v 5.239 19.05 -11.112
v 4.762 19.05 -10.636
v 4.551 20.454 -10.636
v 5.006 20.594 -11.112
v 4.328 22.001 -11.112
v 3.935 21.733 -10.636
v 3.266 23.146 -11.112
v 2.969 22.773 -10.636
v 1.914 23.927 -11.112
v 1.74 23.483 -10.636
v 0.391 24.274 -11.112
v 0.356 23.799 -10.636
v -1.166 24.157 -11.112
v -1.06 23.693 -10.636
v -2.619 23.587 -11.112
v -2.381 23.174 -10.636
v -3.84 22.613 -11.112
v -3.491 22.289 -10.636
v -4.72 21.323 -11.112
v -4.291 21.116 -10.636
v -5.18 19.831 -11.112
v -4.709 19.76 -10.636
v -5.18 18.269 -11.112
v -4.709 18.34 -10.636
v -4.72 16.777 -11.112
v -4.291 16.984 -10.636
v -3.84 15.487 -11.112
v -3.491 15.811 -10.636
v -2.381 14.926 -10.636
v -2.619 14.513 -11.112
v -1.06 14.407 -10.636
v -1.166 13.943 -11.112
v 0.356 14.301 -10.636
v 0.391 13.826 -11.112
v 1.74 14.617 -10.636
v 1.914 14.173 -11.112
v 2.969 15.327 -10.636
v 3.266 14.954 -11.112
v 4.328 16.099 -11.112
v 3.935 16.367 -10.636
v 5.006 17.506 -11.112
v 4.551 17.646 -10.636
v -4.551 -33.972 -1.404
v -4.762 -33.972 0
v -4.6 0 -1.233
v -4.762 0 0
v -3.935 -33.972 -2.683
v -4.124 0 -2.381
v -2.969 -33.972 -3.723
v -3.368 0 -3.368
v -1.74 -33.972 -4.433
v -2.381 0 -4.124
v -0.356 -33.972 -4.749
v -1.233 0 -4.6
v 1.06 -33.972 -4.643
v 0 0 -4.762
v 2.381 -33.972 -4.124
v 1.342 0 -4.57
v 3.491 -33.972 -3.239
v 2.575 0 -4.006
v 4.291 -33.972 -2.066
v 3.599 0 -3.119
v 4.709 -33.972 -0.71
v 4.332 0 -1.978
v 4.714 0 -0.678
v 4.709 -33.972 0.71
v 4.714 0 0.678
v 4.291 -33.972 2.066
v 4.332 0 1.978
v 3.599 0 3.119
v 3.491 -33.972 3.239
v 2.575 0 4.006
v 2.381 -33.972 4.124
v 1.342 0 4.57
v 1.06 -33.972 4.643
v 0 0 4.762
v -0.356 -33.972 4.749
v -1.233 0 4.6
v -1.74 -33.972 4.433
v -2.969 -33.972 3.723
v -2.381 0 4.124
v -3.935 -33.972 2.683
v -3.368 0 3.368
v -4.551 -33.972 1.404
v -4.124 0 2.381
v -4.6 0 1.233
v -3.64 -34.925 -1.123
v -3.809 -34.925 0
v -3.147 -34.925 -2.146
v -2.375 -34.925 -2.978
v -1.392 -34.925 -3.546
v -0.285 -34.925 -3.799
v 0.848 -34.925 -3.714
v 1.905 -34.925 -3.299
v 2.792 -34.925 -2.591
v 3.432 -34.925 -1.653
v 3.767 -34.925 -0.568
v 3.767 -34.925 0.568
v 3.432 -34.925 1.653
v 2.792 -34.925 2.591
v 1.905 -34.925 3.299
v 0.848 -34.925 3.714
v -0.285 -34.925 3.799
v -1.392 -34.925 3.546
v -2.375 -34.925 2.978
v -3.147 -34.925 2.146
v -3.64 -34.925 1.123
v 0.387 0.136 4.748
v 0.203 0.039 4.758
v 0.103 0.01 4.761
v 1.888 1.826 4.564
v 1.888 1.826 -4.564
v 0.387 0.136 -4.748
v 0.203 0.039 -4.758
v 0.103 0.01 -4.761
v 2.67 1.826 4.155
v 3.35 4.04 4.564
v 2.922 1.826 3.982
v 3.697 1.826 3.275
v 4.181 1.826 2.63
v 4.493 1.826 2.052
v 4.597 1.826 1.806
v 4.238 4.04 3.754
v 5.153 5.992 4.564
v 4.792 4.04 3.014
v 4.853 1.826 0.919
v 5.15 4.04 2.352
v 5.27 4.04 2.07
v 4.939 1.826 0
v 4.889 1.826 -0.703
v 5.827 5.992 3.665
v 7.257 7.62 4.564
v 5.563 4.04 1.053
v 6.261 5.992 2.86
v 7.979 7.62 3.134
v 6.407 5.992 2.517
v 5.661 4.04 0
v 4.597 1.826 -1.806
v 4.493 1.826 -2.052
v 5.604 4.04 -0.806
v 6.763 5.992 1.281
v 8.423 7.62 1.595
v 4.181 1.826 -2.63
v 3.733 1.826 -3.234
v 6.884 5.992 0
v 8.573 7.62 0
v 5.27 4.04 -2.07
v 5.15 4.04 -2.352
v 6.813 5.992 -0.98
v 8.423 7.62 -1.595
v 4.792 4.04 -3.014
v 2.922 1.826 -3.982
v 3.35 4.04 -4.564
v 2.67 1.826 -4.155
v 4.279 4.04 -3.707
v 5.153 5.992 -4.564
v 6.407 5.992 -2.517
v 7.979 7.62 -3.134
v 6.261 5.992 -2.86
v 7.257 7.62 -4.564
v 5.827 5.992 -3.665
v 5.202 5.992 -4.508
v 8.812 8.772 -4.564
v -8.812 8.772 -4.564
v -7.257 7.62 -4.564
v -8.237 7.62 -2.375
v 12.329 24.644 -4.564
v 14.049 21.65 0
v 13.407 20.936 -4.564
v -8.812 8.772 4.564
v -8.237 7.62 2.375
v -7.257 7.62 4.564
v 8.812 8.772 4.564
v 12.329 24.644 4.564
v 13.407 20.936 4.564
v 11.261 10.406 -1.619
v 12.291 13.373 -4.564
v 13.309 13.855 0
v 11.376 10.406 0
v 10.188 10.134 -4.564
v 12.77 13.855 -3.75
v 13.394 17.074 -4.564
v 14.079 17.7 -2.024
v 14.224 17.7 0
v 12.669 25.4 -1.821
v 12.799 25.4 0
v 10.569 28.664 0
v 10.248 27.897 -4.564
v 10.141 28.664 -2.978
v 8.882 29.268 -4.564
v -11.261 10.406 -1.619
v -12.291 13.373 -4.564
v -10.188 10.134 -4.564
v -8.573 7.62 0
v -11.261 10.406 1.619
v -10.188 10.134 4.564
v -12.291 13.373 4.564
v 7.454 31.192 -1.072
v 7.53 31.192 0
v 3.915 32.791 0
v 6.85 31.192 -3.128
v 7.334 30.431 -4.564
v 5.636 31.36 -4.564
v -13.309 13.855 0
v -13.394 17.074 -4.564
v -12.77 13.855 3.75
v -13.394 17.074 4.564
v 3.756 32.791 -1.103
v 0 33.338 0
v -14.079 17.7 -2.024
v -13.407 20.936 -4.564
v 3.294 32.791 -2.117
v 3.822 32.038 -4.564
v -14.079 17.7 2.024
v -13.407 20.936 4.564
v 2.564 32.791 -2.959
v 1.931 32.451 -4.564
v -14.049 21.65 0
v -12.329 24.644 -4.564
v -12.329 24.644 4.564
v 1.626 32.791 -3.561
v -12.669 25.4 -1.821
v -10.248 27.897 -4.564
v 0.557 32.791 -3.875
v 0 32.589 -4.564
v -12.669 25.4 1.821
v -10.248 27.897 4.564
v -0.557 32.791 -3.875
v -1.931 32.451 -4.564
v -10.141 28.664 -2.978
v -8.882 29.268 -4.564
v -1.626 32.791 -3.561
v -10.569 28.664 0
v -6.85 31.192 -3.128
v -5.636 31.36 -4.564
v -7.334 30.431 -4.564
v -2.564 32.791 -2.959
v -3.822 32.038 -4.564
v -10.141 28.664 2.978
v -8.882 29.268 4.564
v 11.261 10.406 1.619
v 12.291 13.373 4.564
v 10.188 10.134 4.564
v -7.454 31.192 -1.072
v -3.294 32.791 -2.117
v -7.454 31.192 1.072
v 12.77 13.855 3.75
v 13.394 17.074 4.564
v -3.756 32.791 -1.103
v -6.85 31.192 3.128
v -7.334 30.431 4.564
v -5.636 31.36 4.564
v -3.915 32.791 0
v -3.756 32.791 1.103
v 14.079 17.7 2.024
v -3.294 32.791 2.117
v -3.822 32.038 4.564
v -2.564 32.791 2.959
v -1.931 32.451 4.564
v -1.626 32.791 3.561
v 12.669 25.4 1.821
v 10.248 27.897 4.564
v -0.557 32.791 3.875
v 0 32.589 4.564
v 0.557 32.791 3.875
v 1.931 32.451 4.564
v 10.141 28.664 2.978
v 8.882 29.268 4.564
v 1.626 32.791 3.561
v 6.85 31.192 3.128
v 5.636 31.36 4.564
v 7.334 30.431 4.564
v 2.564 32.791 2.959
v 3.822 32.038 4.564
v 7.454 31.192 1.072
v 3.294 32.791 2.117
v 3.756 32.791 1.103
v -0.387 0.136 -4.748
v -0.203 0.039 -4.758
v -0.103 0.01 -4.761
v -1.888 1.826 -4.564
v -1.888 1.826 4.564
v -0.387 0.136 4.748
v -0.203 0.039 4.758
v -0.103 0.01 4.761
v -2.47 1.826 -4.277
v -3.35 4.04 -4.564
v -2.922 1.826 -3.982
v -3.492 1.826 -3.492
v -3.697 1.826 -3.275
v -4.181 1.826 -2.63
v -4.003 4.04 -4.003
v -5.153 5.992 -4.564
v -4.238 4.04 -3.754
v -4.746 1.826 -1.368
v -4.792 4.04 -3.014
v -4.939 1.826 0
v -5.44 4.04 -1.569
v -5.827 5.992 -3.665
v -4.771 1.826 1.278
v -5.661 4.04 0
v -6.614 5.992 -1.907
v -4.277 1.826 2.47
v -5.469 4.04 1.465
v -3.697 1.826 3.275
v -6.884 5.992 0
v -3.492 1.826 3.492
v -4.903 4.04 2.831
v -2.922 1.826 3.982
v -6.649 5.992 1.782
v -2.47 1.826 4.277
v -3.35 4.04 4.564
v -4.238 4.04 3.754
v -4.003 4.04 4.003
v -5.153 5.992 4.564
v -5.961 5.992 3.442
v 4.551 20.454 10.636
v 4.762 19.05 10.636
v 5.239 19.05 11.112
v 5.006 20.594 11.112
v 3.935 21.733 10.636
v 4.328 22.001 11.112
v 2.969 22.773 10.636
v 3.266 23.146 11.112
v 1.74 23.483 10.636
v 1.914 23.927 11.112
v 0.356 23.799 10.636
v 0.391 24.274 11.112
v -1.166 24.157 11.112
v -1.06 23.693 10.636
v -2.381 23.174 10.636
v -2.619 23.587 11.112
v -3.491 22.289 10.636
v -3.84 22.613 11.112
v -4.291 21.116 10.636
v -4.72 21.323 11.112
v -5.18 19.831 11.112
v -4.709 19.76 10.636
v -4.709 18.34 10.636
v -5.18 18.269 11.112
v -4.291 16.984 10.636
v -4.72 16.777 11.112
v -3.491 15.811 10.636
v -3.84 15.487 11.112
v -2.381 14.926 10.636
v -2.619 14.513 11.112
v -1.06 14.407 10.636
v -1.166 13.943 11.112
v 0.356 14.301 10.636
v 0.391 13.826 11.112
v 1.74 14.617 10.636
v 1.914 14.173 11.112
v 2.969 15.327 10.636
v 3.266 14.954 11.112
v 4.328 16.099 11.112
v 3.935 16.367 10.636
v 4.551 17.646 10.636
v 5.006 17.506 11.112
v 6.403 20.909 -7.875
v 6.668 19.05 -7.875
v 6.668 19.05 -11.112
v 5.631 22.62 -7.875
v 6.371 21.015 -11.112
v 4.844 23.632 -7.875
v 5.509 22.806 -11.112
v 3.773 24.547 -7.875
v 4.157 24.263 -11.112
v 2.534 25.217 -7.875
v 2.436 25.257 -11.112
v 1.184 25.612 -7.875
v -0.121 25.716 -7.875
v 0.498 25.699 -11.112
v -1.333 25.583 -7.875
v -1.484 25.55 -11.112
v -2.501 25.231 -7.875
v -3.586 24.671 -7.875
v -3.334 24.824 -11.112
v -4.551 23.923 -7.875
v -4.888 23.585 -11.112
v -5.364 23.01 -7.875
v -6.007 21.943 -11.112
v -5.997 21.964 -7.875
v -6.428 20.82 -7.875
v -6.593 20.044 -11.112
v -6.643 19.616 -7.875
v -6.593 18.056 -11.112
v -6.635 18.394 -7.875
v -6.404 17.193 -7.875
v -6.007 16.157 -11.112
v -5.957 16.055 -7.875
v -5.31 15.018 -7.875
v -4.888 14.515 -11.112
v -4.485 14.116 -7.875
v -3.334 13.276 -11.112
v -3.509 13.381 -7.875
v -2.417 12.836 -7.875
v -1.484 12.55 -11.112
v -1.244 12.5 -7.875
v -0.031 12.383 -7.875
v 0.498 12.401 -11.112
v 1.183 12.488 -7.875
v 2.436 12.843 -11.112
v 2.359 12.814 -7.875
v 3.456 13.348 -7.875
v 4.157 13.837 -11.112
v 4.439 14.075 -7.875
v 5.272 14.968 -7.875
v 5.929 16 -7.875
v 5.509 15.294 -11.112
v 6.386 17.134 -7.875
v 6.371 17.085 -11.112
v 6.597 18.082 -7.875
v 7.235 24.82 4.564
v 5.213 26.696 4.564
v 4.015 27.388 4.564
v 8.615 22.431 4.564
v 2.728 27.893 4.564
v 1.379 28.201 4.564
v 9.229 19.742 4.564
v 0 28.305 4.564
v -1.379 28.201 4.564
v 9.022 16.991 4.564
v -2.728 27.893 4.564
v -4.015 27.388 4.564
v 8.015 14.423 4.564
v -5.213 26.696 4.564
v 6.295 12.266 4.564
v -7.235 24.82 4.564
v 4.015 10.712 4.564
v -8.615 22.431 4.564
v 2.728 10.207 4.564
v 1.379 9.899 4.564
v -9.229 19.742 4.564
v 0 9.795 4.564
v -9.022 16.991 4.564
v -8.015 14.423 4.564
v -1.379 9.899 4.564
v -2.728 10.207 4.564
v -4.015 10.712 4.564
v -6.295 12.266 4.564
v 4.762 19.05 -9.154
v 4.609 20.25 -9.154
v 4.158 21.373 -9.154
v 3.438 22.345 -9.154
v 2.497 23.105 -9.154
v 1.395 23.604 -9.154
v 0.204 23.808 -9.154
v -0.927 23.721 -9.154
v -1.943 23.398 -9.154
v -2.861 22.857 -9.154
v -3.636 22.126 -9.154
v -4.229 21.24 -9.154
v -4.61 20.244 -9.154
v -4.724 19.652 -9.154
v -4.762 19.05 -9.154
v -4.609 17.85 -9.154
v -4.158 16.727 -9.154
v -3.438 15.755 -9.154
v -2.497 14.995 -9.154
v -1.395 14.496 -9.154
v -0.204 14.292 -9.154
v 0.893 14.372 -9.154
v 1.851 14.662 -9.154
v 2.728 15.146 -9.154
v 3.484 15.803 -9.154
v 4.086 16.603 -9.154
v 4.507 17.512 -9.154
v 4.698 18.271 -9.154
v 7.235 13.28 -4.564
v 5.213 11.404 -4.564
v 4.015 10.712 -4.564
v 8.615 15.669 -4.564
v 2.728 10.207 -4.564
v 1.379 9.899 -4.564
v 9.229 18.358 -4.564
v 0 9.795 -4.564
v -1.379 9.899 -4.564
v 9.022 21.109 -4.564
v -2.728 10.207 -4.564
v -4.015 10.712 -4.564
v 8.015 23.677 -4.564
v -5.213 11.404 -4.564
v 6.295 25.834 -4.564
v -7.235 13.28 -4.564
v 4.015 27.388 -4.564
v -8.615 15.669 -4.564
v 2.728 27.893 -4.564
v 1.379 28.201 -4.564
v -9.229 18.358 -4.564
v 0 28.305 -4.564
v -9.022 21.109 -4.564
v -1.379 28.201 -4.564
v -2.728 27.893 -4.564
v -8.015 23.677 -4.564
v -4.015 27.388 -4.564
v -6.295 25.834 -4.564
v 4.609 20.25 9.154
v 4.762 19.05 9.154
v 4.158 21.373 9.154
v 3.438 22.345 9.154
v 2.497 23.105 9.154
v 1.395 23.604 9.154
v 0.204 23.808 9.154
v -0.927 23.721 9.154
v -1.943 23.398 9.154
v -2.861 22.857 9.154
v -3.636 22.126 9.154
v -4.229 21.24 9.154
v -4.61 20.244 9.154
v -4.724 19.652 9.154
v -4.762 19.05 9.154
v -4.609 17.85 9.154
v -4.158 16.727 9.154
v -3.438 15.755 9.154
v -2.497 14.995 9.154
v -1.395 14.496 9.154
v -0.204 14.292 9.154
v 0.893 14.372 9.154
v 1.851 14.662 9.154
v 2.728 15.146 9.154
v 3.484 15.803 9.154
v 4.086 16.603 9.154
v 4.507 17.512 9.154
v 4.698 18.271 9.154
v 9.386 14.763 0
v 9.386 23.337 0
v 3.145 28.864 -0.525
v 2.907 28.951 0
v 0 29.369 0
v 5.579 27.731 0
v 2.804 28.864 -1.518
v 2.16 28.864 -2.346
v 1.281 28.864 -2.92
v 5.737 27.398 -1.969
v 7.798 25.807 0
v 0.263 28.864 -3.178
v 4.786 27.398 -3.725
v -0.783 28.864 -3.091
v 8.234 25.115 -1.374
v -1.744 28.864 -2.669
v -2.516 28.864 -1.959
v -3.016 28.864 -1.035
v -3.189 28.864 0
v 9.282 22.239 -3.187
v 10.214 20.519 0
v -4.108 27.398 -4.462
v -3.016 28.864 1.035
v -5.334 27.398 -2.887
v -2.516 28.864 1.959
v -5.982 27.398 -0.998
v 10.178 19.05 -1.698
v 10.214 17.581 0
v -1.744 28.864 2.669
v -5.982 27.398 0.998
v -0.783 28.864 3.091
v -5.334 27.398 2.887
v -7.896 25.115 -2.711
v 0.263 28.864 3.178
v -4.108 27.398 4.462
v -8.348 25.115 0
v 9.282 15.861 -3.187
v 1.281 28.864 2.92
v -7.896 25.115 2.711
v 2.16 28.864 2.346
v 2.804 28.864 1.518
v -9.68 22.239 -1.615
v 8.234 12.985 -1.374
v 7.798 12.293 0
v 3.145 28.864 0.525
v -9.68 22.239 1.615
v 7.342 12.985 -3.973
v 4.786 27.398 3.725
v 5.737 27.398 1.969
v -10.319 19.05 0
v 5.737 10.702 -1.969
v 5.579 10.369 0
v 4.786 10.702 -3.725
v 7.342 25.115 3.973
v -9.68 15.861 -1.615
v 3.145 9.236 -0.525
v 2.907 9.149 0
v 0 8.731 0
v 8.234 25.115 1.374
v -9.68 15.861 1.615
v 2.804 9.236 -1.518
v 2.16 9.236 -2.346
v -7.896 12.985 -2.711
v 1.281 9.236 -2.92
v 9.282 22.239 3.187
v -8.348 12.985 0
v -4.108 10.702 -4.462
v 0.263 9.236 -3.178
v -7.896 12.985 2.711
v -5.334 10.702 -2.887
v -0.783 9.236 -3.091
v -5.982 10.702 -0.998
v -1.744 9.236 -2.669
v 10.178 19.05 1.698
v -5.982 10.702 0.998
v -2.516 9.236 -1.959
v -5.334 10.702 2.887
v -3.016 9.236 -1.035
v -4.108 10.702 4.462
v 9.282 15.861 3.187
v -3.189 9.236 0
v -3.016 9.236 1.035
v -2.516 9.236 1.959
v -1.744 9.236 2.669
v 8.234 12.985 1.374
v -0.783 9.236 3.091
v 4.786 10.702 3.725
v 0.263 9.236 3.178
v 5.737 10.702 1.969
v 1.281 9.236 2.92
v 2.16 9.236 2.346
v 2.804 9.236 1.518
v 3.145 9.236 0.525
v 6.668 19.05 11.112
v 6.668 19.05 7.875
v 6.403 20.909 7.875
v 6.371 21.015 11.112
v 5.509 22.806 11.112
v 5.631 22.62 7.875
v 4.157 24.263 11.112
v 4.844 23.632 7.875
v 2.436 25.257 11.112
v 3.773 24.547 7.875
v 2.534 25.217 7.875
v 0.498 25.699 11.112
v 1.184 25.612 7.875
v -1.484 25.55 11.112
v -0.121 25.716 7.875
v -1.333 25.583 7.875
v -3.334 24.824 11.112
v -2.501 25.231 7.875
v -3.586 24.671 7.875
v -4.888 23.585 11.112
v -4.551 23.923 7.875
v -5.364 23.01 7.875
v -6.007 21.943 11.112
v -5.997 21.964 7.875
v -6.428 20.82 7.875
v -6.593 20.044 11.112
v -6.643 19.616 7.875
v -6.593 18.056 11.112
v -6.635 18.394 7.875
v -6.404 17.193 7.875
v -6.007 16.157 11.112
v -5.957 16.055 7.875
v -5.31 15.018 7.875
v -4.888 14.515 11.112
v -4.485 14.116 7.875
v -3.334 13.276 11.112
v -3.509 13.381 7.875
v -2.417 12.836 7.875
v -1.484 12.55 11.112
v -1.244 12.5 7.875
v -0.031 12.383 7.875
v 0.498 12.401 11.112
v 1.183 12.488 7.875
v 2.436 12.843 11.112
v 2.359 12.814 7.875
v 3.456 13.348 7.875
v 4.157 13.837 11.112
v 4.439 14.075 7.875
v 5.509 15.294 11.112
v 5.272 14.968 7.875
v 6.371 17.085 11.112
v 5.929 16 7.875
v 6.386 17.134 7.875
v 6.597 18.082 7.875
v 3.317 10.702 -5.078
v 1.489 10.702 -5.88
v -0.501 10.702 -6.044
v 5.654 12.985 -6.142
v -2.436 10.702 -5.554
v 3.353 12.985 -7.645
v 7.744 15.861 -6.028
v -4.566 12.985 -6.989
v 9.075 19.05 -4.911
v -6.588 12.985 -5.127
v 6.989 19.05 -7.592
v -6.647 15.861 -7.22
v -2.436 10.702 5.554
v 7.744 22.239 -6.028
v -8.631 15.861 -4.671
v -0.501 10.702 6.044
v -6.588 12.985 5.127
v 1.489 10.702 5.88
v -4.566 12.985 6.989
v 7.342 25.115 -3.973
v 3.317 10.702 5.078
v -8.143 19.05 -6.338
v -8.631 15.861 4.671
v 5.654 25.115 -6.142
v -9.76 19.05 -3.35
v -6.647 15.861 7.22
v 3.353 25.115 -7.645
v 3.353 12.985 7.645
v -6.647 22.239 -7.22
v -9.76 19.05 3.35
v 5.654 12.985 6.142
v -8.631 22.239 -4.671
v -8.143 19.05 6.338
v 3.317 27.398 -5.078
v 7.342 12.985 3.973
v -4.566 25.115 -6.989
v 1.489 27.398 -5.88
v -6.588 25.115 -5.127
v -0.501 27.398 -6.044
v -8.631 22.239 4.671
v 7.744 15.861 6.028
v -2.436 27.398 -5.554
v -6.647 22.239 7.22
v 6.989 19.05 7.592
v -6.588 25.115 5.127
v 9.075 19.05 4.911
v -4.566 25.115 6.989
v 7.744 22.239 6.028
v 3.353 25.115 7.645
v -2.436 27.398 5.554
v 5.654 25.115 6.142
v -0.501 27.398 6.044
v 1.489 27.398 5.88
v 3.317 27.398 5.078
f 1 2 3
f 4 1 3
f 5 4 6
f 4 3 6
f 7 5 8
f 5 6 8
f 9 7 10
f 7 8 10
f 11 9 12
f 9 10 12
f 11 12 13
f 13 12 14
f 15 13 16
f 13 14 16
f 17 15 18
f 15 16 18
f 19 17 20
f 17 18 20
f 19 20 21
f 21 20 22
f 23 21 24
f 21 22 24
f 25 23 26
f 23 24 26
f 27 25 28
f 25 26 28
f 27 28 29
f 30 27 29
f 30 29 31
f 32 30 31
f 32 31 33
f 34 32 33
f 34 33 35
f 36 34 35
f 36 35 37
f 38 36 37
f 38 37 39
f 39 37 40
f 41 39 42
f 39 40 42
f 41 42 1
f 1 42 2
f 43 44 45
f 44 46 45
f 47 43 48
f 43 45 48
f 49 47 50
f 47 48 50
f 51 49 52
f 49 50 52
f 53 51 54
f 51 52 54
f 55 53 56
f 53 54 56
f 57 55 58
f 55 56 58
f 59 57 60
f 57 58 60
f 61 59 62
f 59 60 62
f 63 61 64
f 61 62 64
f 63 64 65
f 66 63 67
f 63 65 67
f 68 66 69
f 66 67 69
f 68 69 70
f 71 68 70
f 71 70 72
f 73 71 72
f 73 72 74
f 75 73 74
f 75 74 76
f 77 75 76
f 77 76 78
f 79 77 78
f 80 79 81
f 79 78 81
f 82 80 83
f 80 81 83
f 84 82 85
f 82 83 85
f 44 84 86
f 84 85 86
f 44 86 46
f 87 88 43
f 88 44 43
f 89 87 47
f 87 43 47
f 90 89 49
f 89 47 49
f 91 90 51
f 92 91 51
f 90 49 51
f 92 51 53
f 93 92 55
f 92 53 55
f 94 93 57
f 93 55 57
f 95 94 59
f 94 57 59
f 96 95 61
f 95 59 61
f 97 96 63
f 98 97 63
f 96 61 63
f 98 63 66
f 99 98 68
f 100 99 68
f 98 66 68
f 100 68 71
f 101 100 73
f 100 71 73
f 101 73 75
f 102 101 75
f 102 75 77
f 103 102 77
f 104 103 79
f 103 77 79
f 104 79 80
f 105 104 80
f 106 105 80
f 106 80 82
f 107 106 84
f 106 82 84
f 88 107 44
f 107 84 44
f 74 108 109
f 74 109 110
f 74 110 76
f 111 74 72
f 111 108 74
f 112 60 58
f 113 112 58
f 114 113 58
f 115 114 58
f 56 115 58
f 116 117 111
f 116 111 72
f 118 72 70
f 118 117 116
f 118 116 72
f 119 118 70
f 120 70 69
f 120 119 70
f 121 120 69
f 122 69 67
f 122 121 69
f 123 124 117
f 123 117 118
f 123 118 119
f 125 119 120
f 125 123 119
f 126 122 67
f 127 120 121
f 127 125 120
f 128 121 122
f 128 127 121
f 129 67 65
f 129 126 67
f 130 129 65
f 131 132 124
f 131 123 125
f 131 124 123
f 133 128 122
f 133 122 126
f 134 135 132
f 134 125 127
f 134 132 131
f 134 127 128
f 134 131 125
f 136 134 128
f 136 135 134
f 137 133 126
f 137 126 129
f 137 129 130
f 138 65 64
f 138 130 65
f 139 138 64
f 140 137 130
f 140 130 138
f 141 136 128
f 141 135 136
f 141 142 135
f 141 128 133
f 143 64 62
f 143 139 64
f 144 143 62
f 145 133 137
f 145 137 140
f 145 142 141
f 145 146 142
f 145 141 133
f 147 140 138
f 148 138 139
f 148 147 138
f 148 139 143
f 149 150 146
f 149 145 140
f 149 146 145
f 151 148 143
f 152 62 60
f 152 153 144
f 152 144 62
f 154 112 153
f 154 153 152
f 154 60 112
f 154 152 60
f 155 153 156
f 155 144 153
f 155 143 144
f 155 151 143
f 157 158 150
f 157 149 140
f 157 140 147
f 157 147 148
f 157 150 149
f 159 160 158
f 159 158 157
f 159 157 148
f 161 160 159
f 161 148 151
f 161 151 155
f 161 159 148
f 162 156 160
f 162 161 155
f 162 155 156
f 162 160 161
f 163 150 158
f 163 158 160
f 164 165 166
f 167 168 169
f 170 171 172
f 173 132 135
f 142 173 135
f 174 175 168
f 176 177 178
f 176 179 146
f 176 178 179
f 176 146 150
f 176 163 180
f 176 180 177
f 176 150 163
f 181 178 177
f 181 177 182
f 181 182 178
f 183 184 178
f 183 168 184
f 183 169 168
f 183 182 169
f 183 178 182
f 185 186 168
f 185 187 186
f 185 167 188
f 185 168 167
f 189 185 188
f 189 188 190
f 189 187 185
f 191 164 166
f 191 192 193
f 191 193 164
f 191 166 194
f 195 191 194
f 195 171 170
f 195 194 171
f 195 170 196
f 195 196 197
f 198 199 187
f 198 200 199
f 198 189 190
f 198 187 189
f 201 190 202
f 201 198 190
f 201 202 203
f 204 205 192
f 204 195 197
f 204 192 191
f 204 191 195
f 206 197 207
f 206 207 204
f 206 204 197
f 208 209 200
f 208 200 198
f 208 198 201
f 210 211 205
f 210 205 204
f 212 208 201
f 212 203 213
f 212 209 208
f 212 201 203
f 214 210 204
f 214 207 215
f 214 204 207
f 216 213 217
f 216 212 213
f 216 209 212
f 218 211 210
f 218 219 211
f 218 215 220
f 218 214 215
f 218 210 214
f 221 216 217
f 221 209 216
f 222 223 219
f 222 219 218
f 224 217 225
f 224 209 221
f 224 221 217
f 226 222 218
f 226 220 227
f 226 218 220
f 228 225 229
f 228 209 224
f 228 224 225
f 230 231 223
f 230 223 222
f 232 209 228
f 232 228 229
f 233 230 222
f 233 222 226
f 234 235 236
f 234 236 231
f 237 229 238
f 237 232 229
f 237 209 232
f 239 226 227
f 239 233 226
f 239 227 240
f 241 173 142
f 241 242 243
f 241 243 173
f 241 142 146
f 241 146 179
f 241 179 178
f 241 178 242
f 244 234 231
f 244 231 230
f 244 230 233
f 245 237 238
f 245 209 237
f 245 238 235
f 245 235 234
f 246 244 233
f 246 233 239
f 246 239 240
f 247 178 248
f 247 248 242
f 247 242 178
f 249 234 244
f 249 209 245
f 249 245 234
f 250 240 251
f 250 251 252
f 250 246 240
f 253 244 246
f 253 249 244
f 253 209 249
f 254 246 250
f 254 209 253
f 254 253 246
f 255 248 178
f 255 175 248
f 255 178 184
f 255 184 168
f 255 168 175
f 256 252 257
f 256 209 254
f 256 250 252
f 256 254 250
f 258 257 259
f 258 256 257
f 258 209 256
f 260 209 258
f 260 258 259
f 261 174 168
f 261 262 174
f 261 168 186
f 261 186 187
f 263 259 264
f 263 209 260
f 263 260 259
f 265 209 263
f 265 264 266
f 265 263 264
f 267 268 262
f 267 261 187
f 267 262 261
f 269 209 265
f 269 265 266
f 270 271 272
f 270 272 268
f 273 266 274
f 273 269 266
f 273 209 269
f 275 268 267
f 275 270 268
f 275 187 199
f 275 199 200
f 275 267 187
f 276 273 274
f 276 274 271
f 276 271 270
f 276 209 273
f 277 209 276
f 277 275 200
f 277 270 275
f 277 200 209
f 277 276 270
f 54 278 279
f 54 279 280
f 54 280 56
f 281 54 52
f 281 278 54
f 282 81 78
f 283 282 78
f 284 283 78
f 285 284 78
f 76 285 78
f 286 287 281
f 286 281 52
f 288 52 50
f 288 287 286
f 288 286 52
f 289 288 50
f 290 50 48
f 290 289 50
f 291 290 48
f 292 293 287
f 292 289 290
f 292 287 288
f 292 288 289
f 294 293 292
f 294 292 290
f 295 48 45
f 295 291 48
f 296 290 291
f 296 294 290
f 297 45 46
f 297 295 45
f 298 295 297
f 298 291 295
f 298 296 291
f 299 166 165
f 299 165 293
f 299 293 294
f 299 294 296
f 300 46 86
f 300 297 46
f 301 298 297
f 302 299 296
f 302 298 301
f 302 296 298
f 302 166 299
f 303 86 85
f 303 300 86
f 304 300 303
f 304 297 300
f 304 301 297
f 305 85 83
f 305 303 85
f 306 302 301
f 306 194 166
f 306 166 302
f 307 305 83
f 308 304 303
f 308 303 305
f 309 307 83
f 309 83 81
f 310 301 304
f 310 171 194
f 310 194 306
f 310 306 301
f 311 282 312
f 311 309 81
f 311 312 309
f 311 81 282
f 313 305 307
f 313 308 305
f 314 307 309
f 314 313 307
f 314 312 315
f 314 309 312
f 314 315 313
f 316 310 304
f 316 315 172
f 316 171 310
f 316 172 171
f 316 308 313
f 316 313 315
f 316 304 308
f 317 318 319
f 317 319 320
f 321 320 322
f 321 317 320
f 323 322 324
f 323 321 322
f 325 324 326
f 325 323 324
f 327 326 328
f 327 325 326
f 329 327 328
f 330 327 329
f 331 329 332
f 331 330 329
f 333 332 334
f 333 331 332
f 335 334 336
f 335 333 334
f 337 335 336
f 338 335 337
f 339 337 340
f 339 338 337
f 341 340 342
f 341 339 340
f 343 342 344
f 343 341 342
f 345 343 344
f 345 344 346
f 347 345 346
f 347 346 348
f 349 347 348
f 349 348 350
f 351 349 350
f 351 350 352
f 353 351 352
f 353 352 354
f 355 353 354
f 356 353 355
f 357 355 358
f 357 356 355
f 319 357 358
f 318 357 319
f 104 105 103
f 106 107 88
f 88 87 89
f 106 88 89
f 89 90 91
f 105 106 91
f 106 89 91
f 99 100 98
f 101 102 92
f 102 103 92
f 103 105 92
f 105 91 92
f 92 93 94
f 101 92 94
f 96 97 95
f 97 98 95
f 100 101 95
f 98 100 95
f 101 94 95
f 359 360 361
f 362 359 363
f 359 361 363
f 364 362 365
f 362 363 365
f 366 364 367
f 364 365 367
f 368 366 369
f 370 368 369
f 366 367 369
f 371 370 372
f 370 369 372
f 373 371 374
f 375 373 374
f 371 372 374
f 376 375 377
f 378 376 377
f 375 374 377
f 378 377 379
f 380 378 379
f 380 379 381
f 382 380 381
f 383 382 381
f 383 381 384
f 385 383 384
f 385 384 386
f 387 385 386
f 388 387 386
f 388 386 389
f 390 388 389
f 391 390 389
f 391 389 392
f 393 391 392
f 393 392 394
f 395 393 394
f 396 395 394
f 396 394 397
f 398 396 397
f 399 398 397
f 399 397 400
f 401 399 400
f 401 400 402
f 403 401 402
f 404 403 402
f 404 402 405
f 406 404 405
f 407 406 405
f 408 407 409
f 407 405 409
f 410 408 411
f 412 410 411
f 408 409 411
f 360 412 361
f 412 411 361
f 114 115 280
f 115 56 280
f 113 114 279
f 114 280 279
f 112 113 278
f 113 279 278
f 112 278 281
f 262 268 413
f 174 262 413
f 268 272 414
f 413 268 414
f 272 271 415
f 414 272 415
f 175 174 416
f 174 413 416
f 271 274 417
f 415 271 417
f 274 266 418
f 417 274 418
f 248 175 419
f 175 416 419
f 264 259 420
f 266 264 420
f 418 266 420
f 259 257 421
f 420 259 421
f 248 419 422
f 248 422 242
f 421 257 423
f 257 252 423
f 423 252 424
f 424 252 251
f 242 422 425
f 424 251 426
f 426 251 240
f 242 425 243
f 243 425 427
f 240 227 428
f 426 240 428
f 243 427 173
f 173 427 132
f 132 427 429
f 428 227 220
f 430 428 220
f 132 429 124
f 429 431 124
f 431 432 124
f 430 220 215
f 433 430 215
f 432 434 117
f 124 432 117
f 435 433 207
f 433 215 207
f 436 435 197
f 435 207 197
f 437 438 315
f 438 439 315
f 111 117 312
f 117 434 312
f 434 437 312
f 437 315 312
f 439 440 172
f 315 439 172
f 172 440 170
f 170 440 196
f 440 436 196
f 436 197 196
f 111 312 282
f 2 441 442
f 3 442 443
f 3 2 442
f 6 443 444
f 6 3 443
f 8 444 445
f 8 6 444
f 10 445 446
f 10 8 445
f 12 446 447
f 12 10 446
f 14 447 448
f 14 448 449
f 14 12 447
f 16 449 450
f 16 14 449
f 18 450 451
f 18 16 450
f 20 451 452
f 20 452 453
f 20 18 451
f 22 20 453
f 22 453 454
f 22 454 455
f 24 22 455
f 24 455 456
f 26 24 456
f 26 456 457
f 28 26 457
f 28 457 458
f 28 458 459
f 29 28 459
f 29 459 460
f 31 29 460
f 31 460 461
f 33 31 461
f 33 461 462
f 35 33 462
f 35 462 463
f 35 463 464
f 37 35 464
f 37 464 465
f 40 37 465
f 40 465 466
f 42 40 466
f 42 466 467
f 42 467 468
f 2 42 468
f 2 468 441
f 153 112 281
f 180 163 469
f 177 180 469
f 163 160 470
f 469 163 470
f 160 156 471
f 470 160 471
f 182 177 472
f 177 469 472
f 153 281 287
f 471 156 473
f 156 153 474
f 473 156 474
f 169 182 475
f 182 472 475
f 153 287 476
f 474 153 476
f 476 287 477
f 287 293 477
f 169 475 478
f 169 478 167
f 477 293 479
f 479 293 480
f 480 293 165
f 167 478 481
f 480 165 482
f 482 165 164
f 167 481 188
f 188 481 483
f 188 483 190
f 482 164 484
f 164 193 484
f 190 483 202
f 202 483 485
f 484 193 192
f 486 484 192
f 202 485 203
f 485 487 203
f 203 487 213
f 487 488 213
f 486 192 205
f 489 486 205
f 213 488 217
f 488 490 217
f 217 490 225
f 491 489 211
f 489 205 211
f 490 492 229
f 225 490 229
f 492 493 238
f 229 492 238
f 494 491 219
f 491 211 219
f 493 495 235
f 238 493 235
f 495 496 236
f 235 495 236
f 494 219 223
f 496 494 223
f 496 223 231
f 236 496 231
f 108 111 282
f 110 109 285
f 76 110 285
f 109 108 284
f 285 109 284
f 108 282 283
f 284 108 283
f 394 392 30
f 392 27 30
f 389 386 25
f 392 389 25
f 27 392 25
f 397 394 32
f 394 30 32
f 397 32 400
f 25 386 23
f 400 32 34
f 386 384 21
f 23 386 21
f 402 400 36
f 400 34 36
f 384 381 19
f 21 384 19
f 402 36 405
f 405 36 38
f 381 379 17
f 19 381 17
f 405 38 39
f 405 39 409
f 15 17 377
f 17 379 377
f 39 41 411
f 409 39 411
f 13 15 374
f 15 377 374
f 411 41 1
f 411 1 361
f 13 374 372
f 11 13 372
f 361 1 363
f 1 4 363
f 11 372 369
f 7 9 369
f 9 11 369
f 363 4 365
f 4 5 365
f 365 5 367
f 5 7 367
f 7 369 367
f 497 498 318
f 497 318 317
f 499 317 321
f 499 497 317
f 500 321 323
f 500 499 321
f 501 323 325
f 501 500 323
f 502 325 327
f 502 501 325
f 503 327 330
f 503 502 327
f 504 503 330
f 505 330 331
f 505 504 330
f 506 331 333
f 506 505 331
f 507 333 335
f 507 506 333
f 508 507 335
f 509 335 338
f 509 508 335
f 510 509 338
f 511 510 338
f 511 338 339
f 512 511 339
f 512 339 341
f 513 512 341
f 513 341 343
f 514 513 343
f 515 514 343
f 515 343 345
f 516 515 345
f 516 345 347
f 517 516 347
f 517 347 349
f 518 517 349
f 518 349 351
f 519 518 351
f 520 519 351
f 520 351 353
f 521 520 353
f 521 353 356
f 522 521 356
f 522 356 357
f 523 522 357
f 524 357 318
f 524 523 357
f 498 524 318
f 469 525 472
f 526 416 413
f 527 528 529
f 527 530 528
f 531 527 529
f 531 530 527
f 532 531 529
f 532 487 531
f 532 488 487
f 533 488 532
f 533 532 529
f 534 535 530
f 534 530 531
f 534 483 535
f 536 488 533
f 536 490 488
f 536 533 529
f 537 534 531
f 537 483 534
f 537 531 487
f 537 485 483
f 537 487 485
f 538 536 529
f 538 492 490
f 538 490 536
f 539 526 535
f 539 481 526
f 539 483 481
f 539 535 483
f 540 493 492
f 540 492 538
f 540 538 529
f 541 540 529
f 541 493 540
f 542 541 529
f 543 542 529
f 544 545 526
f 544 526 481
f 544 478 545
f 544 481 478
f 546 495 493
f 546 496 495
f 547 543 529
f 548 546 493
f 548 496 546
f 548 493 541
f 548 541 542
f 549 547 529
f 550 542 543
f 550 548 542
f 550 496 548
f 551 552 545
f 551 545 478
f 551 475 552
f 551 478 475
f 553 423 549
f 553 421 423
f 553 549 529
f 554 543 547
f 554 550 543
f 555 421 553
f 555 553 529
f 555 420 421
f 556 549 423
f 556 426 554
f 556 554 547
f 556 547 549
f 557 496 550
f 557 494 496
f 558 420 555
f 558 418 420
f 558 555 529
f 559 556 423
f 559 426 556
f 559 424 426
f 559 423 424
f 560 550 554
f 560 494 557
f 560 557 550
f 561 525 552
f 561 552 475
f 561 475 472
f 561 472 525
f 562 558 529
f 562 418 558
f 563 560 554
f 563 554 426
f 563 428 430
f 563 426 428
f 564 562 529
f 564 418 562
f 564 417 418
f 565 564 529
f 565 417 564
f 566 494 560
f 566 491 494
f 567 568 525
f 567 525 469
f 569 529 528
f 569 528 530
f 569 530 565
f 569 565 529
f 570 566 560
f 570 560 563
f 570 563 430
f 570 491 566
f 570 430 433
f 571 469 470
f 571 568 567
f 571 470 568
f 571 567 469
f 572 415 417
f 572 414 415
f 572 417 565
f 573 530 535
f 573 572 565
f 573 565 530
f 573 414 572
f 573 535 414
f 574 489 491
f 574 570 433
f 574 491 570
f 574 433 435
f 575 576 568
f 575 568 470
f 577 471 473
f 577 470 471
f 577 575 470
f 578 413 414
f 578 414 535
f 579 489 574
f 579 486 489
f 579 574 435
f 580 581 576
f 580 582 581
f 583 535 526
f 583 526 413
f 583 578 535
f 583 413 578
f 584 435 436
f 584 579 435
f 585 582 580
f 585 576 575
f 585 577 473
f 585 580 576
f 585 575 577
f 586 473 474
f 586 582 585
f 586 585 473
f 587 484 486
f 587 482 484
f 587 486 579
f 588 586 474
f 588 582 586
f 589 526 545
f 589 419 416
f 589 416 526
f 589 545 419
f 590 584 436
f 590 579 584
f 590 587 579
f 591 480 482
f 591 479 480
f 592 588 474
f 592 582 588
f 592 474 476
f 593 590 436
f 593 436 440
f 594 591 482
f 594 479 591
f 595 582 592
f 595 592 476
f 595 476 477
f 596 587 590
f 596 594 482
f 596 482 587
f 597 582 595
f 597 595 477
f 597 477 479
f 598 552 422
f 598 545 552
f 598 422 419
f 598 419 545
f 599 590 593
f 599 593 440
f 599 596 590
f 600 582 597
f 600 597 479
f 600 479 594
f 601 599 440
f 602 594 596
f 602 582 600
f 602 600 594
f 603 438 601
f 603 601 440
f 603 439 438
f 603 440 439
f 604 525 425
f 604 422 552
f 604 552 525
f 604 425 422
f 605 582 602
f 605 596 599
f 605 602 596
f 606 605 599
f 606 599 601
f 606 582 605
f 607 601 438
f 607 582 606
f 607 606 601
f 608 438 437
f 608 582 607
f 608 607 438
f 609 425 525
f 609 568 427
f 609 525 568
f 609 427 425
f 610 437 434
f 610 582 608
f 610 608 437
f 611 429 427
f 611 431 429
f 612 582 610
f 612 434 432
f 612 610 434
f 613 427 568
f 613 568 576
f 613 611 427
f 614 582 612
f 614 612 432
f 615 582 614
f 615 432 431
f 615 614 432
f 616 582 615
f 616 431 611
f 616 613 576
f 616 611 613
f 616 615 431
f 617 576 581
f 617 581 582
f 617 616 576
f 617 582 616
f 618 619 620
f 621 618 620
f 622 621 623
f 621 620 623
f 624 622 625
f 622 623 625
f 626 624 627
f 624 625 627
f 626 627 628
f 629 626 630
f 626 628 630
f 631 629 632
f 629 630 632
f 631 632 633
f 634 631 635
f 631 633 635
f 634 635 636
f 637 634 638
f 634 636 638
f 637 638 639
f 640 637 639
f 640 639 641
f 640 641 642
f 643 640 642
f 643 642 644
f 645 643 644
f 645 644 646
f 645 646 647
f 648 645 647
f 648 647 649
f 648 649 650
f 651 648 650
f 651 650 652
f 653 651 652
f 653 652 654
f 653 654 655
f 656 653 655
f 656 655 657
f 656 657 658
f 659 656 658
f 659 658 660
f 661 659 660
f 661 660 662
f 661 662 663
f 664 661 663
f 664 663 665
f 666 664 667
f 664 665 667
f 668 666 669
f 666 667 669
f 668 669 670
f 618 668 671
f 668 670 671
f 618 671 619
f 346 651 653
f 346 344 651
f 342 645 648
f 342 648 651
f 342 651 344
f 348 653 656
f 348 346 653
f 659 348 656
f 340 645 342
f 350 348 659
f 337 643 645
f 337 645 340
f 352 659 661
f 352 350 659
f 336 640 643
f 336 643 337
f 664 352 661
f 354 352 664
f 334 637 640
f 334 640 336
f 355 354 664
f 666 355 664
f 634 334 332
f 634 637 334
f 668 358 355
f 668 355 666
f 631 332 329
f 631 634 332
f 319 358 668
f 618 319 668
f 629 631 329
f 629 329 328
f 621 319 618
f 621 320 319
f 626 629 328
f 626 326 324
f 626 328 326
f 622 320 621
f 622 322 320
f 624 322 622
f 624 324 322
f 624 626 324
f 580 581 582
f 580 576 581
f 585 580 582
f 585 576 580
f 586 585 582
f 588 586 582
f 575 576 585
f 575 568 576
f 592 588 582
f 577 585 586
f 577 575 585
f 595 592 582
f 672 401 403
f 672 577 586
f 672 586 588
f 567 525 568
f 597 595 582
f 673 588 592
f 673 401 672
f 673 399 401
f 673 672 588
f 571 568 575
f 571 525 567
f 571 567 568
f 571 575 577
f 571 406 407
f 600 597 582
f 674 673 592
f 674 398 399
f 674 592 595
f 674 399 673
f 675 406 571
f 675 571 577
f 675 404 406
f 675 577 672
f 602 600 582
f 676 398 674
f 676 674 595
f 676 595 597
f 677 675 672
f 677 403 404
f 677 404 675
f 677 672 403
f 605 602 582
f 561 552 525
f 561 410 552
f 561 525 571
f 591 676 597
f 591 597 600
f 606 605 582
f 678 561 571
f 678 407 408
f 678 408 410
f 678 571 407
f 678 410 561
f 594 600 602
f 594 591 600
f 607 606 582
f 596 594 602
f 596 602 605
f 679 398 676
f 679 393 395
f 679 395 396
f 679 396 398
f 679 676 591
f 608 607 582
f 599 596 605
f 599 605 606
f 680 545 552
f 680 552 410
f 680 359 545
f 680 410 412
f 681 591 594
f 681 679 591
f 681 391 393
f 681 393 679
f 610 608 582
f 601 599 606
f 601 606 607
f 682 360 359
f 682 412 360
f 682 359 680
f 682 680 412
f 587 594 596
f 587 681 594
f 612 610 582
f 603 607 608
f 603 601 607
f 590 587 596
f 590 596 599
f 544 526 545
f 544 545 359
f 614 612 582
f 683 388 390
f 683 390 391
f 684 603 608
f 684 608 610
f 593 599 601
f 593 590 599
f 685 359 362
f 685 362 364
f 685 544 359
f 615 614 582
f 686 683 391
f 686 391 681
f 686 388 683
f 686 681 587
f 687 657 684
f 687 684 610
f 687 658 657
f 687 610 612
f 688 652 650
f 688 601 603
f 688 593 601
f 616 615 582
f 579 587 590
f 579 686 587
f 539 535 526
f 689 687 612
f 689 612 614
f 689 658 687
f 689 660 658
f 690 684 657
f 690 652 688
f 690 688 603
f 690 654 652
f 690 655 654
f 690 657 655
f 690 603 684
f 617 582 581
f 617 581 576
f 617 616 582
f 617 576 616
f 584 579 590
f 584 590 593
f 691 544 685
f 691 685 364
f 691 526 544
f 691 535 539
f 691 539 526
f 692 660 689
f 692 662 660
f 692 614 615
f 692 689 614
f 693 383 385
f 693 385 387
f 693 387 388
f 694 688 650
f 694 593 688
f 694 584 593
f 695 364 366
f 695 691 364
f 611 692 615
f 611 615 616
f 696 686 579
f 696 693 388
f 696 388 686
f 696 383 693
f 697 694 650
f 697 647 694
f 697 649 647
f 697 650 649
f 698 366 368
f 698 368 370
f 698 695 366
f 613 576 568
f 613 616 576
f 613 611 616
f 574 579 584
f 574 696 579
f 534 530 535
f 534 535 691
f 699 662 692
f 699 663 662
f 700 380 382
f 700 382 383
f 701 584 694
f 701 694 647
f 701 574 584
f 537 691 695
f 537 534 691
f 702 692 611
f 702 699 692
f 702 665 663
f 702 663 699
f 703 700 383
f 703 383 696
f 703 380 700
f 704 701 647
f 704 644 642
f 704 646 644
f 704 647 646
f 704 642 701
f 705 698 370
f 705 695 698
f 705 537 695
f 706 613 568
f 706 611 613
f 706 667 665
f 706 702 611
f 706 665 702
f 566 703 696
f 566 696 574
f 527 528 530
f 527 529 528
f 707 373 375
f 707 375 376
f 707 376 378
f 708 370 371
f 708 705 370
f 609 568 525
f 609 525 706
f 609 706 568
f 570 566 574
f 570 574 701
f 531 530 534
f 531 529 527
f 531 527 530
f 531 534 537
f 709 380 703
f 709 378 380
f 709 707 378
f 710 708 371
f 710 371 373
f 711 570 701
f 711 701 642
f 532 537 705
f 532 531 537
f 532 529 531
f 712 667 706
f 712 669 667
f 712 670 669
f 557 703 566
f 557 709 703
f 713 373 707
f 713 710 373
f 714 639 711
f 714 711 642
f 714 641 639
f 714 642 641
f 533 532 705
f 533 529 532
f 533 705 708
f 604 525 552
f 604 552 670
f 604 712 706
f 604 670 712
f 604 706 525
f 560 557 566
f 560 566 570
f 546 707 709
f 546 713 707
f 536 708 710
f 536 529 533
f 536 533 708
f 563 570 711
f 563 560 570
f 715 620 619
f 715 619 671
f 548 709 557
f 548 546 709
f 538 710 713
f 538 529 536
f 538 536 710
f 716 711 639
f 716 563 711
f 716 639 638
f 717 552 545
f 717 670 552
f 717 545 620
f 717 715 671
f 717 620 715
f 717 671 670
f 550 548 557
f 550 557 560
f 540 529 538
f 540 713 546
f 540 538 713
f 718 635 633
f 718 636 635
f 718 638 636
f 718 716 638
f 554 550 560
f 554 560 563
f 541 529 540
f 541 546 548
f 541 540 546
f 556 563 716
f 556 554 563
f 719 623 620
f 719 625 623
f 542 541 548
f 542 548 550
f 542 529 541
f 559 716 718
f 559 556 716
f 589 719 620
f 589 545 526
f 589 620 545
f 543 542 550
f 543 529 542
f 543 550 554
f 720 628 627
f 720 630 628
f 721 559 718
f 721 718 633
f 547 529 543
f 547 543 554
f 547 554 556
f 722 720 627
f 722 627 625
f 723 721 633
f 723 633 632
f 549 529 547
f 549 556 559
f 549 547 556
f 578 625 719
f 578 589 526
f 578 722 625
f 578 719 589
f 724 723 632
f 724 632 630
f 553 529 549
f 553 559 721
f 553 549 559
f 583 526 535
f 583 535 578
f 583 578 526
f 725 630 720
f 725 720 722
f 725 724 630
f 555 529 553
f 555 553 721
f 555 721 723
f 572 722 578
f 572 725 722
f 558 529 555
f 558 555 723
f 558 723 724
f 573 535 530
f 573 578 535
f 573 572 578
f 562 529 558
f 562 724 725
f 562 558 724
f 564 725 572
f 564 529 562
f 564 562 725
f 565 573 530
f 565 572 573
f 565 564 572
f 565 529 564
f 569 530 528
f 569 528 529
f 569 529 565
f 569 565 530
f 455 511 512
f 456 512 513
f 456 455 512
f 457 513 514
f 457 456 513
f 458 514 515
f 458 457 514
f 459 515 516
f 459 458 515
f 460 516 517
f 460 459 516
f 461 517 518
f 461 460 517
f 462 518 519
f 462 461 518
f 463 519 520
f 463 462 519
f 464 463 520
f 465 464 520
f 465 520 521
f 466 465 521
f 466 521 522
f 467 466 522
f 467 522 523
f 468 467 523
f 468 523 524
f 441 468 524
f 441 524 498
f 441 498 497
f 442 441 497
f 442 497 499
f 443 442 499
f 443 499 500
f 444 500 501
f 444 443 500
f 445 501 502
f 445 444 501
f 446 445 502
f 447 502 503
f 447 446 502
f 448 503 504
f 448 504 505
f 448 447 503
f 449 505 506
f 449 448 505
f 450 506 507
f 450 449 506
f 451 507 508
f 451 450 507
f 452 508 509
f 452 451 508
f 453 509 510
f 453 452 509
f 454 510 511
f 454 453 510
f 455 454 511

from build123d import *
from OCP.BRepAlgoAPI import BRepAlgoAPI_Cut
from OCP.TopTools import TopTools_ListOfShape

# Parameters (mm, degrees)
CUT_EXTRUDE1_DEPTH      = 41.348741461
CUT_EXTRUDE1_DEPTH_BACK = 41.348741461
CUT_EXTRUDE4_DEPTH      = 40.119878359
CUT_EXTRUDE4_DEPTH_BACK = 40.119878359
SKETCH10_R              = 4.7625
EXTRUDE1_DEPTH          = 11.1125
EXTRUDE1_DEPTH_BACK     = 11.1125
SKETCH12_R              = 6.6675
SKETCH12_R_2            = 4.7625
CHAMFER1_SIZE           = 0.47625


with BuildPart() as part:
    # Sketch13 → Revolve4 (revolve)
    with BuildSketch(Plane.XY, mode=Mode.PRIVATE) as revolve4_sk:
        Polygon((3.809238, -34.925), (4.7625, -33.971738), (4.7625, 0), (0, 0), (0, -34.925), align=None)
    revolve(revolve4_sk.sketch.rotate(Axis((0, 0, 0), (0, -1, 0)), 180), axis=Axis((0, 0, 0), (0, -1, 0)))

    # Sketch4 → Revolve2 (revolve)
    with BuildSketch(Plane.XY):
        with BuildLine():
            Line((0, 8.73125), (0, 0))
            Line((0, 0), (4.7625, 0))
            ThreePointArc((4.7625, 0), (5.768081006, 4.259709497), (8.5725, 7.62))
            ThreePointArc((8.5725, 7.62), (13.554312621, 23.568104207), (0, 33.3375))
            Line((0, 33.3375), (0, 29.36875))
            ThreePointArc((0, 29.36875), (10.31875, 19.05), (0, 8.73125))
        make_face()
    revolve(axis=Axis((0, 33.3375, 0), (0, 1, 0)))


with BuildPart() as cut_extrude1_tool:
    # Sketch5 → Cut-Extrude1 (new, two sides: drawn at the far end of the back side and taken through both)
    with BuildSketch(Plane(origin=(0, 0, 0), x_dir=(0, 0, -1), z_dir=(1, 0, 0)).offset(-CUT_EXTRUDE1_DEPTH_BACK)):
        Polygon((4.5640625, 33.3375), (14.2875, 33.3375), (14.2875, 0), (4.7625, 0), (4.5640625, 1.825625), align=None)
        Polygon((-4.5640625, 33.3375), (-4.5640625, 1.825625), (-4.7625, 0), (-14.2875, 0), (-14.2875, 33.3375), align=None)
    extrude(amount=CUT_EXTRUDE1_DEPTH + CUT_EXTRUDE1_DEPTH_BACK)


with BuildPart() as part_1:
    add(part.part)

    # Cut-Extrude1: cut by cut_extrude1_tool, with a tolerance
    cut_extrude1_stock = TopTools_ListOfShape()
    cut_extrude1_stock.Append(part_1.part.wrapped)
    cut_extrude1_tools = TopTools_ListOfShape()
    cut_extrude1_tools.Append(cut_extrude1_tool.part.wrapped)
    cut_extrude1_cut = BRepAlgoAPI_Cut()
    cut_extrude1_cut.SetArguments(cut_extrude1_stock)
    cut_extrude1_cut.SetTools(cut_extrude1_tools)
    cut_extrude1_cut.SetFuzzyValue(0.00001)
    cut_extrude1_cut.Build()
    add(Compound.cast(cut_extrude1_cut.Shape()).solids(), mode=Mode.REPLACE)


with BuildPart() as body_2:
    # Sketch7 → Revolve3 (revolve)
    with BuildSketch(Plane.XY):
        with BuildLine():
            Line((0, 29.36875), (0, 8.73125))
            ThreePointArc((0, 8.73125), (10.31875, 19.05), (0, 29.36875))
        make_face()
    revolve(axis=Axis((0, 0, 0), (0, 1, 0)))

    # Sketch10 → Cut-Extrude4 (cut, two sides: drawn at the far end of the back side and taken through both)
    with BuildSketch(Plane.XY.offset(-CUT_EXTRUDE4_DEPTH_BACK)):
        with Locations(Location((0, 19.05, 0), (0, 0, 180))):
            Circle(SKETCH10_R)
    extrude(amount=CUT_EXTRUDE4_DEPTH + CUT_EXTRUDE4_DEPTH_BACK, mode=Mode.SUBTRACT)

    # Sketch12 → Extrude1 (add, two sides: drawn at the far end of the back side and taken through both)
    with BuildSketch(Plane.XY.offset(-EXTRUDE1_DEPTH_BACK)):
        with Locations((0, 19.05)):
            Circle(SKETCH12_R)
        with Locations((0, 19.05)):
            Circle(SKETCH12_R_2, mode=Mode.SUBTRACT)
    extrude(amount=EXTRUDE1_DEPTH + EXTRUDE1_DEPTH_BACK)

    # Chamfer1
    chamfer1_edges = [body_2.edges().sort_by_distance(p)[0] for p in [
        (-4.7625, 19.05, 11.1125),
        (-4.7625, 19.05, -11.1125),
    ]]
    chamfer(chamfer1_edges, length=CHAMFER1_SIZE)


solid = Compound([part_1.part, body_2.part])
